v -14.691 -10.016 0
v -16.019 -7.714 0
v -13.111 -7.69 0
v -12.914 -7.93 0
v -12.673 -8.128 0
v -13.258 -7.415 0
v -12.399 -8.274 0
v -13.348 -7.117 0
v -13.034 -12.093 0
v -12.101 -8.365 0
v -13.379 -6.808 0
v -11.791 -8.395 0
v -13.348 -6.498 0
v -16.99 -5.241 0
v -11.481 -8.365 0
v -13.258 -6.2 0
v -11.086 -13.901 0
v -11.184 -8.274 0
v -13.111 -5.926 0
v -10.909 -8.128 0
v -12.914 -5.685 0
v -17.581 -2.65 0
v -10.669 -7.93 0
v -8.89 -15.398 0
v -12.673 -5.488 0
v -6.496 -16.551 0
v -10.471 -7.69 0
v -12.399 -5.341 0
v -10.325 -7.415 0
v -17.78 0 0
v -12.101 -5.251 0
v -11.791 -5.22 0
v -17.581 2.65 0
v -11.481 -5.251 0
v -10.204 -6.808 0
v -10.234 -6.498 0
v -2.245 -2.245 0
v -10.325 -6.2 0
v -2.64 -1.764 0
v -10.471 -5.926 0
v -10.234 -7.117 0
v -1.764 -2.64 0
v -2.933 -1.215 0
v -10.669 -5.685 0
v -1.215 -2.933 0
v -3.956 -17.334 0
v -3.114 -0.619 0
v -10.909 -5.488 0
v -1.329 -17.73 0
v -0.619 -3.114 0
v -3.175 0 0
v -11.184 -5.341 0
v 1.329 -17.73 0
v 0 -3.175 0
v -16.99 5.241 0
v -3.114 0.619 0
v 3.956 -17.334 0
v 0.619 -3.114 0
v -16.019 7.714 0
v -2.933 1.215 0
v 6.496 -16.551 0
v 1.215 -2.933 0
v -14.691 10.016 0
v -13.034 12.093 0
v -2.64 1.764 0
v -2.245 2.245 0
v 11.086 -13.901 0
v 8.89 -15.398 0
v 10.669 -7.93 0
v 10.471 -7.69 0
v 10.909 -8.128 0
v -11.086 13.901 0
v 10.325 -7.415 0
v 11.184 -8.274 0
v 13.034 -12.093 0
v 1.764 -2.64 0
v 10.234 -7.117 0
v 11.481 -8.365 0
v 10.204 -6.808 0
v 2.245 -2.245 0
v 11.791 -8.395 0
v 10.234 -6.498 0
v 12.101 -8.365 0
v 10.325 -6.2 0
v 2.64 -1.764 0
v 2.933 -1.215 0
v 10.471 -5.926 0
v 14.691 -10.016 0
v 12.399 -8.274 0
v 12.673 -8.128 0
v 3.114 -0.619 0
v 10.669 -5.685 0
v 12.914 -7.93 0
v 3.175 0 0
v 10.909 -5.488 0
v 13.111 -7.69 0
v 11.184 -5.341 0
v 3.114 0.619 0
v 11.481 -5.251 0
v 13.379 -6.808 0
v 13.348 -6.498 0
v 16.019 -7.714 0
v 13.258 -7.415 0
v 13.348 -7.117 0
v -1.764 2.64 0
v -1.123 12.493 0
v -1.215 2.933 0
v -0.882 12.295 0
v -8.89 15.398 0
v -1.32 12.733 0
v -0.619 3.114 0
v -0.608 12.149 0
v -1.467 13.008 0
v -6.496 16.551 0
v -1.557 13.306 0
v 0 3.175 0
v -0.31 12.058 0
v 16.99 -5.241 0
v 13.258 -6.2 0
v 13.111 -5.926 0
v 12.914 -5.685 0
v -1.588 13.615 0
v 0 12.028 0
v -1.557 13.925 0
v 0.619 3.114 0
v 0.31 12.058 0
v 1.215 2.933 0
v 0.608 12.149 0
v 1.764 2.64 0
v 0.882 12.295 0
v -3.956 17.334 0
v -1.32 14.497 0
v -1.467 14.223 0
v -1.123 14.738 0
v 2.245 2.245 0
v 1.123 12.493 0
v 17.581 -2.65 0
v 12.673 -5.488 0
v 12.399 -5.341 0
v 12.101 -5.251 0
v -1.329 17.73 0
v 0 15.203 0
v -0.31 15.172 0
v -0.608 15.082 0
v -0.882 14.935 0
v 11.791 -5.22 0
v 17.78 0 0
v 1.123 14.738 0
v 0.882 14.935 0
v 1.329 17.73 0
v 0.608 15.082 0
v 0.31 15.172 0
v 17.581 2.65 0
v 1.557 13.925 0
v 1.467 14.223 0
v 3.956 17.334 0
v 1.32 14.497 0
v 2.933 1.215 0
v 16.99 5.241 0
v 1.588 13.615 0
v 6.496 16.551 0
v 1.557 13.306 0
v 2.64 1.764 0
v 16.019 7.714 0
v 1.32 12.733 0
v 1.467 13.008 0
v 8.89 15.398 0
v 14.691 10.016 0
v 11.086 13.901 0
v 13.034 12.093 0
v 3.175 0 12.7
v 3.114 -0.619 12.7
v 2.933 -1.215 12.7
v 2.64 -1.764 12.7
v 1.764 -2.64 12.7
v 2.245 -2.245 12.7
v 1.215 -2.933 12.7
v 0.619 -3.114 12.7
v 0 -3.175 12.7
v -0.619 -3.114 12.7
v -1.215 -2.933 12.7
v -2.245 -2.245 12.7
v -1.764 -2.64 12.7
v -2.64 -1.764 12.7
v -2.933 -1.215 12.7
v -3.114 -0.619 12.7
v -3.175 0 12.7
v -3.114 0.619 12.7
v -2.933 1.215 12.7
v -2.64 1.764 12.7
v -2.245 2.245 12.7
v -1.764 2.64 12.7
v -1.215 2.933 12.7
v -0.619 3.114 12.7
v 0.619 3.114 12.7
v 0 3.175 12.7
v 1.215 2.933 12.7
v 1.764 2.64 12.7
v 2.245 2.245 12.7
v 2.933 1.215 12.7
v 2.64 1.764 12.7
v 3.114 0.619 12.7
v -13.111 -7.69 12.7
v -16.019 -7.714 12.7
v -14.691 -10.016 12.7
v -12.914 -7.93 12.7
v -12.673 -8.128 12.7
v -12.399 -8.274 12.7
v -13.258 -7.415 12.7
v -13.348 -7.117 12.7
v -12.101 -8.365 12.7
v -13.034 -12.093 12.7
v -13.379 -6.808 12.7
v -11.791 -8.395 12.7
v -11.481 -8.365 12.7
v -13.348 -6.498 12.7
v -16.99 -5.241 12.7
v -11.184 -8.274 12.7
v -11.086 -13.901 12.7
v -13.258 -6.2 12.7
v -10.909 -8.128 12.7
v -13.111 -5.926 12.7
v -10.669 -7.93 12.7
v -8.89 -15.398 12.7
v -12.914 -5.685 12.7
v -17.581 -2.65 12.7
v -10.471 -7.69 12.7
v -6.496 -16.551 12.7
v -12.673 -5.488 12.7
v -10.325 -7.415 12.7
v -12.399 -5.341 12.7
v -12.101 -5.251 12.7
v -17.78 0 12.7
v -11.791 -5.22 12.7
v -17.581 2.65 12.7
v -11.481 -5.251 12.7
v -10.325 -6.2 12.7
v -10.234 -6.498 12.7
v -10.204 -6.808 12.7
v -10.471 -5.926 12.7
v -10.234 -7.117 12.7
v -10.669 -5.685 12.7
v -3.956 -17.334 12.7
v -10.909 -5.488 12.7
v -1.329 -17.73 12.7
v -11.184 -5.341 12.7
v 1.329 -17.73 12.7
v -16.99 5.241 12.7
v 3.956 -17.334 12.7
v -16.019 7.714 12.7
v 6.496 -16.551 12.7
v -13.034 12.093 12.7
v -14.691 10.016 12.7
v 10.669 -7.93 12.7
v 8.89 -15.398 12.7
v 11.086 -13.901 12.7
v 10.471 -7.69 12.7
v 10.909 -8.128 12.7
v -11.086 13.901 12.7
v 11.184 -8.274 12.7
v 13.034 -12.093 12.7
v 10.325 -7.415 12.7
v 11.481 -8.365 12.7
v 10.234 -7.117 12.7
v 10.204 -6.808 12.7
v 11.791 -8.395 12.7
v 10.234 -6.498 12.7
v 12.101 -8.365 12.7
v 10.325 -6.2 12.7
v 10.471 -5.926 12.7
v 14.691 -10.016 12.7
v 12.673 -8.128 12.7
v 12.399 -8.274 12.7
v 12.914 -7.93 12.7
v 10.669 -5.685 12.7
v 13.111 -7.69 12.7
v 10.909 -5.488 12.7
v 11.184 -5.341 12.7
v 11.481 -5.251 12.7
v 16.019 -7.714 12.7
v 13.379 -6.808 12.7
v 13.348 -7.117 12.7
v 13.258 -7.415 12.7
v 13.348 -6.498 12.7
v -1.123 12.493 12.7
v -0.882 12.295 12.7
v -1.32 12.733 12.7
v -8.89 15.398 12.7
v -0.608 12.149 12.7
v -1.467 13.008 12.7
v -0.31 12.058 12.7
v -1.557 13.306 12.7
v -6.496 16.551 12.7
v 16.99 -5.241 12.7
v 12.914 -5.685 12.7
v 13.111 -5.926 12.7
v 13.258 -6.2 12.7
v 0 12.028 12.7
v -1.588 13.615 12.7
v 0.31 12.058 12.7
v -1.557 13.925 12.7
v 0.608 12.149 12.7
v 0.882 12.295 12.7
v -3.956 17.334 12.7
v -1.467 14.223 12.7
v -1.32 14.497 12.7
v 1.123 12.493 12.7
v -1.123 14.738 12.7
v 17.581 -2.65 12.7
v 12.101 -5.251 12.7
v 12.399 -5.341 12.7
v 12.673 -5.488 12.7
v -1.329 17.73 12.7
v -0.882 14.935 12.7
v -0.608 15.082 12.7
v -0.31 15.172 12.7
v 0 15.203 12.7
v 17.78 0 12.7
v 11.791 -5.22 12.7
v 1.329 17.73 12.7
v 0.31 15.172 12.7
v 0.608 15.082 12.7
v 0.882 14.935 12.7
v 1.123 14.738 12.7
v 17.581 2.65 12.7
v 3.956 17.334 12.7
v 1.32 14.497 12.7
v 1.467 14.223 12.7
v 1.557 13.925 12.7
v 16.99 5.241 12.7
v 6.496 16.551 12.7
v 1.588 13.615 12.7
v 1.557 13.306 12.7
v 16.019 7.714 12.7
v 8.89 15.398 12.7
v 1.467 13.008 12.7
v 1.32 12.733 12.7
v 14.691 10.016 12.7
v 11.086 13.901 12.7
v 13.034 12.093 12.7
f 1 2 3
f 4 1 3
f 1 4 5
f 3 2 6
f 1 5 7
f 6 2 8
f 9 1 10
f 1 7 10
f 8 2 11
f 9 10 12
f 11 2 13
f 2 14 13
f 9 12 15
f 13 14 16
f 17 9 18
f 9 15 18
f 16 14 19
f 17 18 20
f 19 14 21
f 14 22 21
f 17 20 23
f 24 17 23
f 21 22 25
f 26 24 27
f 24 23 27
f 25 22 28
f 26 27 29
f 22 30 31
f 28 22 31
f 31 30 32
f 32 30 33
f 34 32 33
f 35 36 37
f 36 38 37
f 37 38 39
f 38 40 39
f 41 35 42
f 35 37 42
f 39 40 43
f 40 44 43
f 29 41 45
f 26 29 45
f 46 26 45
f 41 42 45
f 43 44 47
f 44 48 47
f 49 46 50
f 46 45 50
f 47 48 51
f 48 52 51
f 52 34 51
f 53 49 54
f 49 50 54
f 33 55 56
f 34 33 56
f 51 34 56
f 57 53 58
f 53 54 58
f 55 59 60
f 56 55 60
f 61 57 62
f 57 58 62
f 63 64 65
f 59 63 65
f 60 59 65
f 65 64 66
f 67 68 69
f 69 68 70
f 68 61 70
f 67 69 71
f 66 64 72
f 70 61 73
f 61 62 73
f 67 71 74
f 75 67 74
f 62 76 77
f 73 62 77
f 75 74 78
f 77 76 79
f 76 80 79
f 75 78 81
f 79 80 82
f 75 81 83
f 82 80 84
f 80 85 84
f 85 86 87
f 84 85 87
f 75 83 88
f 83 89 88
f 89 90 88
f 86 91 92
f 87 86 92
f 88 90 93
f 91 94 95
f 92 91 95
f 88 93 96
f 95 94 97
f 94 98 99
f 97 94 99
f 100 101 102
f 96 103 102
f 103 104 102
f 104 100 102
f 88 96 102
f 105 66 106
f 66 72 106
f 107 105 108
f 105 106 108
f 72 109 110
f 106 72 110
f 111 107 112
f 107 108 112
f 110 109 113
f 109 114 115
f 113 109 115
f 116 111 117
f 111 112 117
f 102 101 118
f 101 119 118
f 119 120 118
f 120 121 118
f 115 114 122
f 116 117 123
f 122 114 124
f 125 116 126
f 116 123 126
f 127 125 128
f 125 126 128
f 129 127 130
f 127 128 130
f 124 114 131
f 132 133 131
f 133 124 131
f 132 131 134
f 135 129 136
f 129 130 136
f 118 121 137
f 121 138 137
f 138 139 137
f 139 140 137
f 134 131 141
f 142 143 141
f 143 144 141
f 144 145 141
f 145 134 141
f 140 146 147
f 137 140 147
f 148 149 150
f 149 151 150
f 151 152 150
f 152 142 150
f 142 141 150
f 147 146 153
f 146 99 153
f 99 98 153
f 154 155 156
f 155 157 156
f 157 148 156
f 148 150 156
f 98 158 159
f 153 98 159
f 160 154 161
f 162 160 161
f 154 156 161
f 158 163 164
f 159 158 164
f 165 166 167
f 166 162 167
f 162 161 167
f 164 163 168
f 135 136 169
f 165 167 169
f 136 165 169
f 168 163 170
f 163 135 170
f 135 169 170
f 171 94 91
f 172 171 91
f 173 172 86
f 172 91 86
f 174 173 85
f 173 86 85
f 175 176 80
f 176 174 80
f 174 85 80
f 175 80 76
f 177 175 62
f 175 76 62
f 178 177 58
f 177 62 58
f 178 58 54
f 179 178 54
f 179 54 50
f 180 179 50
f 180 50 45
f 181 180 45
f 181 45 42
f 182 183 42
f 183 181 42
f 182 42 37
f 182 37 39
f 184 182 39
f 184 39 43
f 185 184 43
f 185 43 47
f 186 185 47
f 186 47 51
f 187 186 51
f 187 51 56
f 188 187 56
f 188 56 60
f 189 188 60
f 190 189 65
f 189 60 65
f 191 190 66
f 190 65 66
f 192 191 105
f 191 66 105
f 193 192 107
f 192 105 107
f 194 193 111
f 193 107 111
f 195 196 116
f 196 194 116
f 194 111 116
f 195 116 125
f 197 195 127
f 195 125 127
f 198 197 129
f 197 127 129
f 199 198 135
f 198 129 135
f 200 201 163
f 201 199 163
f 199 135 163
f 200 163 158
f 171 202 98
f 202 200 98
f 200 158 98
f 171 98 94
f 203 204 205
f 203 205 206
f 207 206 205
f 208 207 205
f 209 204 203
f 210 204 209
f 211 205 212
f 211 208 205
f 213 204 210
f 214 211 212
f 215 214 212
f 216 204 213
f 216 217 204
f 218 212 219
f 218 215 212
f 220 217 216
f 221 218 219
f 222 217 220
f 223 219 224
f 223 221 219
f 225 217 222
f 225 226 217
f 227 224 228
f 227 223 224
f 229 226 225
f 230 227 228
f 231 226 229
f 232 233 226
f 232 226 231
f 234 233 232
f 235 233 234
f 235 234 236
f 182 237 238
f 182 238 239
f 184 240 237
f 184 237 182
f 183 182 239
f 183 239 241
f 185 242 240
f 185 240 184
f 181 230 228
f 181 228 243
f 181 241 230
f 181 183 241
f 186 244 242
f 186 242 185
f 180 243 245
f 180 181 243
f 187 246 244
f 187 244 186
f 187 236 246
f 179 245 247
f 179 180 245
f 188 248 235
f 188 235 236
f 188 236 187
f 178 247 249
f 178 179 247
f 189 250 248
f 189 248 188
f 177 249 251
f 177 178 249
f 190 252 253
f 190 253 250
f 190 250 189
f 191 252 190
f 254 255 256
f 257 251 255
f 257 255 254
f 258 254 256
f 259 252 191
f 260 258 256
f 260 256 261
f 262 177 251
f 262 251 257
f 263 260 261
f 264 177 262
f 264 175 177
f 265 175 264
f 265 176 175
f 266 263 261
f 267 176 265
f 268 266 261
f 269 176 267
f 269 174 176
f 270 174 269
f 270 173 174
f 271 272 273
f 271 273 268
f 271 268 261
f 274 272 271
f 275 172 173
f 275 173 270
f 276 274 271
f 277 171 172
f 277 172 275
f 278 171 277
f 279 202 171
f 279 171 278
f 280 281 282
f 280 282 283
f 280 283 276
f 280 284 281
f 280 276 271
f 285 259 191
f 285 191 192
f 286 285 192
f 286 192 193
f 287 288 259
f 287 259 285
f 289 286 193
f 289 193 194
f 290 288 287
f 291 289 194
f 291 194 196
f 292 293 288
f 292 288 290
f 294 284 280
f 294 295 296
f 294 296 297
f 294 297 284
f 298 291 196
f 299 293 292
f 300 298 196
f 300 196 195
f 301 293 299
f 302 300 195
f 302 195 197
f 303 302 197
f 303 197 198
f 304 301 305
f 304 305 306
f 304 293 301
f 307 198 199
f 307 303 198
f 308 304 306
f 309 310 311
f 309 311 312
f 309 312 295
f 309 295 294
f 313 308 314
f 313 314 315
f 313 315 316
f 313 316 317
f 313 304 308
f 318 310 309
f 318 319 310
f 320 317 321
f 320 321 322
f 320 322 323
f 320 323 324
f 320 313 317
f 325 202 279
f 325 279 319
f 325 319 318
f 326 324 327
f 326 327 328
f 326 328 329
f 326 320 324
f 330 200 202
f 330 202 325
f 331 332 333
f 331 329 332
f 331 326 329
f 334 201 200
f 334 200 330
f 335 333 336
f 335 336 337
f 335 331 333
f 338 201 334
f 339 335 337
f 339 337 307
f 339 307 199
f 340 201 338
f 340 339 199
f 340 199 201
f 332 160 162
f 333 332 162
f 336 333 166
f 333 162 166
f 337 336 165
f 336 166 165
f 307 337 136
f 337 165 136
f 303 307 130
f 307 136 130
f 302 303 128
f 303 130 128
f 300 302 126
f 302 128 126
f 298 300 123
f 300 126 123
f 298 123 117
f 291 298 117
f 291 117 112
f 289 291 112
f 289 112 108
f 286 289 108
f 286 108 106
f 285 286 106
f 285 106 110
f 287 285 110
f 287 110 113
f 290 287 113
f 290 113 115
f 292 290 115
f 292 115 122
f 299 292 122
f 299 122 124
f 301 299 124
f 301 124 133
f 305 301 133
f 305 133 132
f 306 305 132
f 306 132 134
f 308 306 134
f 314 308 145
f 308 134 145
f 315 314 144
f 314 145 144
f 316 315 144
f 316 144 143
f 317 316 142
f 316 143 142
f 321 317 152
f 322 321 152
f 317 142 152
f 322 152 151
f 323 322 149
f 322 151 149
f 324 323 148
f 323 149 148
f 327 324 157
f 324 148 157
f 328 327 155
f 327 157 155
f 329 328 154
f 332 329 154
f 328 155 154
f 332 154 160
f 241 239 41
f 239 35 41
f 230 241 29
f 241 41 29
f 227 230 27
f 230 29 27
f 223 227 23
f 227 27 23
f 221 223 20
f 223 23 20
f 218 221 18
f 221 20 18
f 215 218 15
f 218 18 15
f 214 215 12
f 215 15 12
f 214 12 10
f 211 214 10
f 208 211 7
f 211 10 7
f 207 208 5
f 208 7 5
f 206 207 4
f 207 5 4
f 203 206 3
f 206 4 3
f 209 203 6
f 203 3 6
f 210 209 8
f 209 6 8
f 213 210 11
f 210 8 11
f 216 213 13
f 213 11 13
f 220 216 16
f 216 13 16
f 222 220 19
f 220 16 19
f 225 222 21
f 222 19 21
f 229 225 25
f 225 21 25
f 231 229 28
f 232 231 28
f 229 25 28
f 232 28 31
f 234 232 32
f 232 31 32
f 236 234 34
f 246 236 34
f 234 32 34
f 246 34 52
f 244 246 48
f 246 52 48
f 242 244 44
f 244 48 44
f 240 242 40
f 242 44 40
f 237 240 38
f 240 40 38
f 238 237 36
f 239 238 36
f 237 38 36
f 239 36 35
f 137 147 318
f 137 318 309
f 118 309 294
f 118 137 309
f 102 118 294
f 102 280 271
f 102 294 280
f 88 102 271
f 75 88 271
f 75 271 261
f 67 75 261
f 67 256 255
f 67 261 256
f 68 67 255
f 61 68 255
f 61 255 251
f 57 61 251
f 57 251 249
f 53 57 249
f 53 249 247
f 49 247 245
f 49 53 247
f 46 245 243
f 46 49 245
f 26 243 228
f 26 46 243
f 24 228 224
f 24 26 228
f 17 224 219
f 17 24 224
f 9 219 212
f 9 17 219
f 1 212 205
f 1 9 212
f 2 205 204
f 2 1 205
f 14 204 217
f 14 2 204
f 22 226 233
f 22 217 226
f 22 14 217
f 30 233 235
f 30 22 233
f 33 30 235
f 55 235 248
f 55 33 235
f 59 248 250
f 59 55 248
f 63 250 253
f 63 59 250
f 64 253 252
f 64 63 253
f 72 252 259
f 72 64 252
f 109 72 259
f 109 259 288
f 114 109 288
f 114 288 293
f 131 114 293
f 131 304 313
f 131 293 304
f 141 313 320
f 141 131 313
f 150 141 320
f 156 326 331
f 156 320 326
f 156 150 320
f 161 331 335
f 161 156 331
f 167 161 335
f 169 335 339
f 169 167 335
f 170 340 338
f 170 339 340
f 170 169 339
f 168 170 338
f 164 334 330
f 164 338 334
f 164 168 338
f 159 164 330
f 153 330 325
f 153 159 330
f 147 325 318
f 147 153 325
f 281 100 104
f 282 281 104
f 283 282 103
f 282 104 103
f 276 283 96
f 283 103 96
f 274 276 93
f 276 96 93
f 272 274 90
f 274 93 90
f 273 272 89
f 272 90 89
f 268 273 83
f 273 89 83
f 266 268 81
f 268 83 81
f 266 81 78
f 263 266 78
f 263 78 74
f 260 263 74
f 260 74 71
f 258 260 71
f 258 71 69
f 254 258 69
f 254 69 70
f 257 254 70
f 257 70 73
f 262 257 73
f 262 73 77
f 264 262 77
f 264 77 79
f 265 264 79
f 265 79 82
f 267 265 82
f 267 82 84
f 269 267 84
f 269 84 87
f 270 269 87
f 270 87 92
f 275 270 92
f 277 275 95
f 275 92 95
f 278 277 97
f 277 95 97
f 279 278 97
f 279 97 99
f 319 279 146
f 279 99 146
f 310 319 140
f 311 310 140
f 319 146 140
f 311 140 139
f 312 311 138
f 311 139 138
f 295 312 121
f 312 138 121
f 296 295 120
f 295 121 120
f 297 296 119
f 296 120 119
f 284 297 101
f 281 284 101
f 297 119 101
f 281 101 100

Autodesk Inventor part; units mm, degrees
ref_plane "YZ Plane" through (0, 0, 0) normal (1, 0, 0) x (0, 1, 0)
ref_plane "XZ Plane" through (0, 0, 0) normal (0, 1, 0) x (-1, 0, 0)
ref_plane "XY Plane" through (0, 0, 0) normal (0, 0, 1) x (1, 0, 0)
sketch "Sketch1" plane through (0, 0, 0) normal (0, 0, 1) x (1, 0, 0)
  circle A0 centre (0, 0) radius 17.78
  circle A1 centre (0, 0) radius 3.175
  circle A2 centre (0, 0) radius 13.6153
  circle A3 centre (0, 13.6153) radius 1.5875
  circle A4 centre (-11.7912, -6.8077) radius 1.5875
  circle A5 centre (11.7912, -6.8077) radius 1.5875
  dimension "d2" = 27.2307
  dimension "d0" = 35.56
  dimension "d1" = 6.35
  dimension "d3" = 3.175
  dimension "d6" = 360
extrude "Extrusion1" add sketch "Sketch1" along normal blind 12.7 contours A0 | A2 A5 A4 A3
sketch "Sketch2" plane through (0, 0, 12.7) normal (0, 0, 1) x (1, 0, 0)
  point P0 (0, 0)
sketch "Sketch3" plane through (0, 0, 12.7) normal (0, 0, 1) x (1, 0, 0)
  circle A0 centre (0, 13.6153) radius 1.5875 projected
  circle A1 centre (0, 13.6153) radius 3.2766
  circle A2 centre (11.7912, -6.8077) radius 1.5875 projected
  circle A3 centre (11.7912, -6.8077) radius 3.2766
  circle A4 centre (-11.7912, -6.8077) radius 1.5875 projected
  circle A5 centre (-11.7912, -6.8077) radius 3.2766
  point P0 (0, 0)
  dimension "d10" = 6.5532
  dimension "d11" = 6.5532
  dimension "d12" = 6.5532
sketch "Sketch4" plane through (0, 0, 12.7) normal (0, 0, 1) x (1, 0, 0)
  circle A0 centre (0, 0) radius 17.78 projected
  line L0 (-17.78, 0) -> (17.78, 0)
sketch "Sketch5" plane through (0, 0, 12.7) normal (0, 0, 1) x (1, 0, 0)
  circle A0 centre (0, 13.6153) radius 1.5875 projected
  line L0 (0, 13.6153) -> (0, 0)
sketch "Sketch6" plane through (0, 0, 0) normal (0, 1, 0) x (-1, 0, 0)
  point P0 (0, 0)
sketch "Sketch7" plane through (0, 0, 12.7) normal (0, 0, 1) x (1, 0, 0)
  point P0 (0, 0)
properties part number "Burner Table IS v01"
